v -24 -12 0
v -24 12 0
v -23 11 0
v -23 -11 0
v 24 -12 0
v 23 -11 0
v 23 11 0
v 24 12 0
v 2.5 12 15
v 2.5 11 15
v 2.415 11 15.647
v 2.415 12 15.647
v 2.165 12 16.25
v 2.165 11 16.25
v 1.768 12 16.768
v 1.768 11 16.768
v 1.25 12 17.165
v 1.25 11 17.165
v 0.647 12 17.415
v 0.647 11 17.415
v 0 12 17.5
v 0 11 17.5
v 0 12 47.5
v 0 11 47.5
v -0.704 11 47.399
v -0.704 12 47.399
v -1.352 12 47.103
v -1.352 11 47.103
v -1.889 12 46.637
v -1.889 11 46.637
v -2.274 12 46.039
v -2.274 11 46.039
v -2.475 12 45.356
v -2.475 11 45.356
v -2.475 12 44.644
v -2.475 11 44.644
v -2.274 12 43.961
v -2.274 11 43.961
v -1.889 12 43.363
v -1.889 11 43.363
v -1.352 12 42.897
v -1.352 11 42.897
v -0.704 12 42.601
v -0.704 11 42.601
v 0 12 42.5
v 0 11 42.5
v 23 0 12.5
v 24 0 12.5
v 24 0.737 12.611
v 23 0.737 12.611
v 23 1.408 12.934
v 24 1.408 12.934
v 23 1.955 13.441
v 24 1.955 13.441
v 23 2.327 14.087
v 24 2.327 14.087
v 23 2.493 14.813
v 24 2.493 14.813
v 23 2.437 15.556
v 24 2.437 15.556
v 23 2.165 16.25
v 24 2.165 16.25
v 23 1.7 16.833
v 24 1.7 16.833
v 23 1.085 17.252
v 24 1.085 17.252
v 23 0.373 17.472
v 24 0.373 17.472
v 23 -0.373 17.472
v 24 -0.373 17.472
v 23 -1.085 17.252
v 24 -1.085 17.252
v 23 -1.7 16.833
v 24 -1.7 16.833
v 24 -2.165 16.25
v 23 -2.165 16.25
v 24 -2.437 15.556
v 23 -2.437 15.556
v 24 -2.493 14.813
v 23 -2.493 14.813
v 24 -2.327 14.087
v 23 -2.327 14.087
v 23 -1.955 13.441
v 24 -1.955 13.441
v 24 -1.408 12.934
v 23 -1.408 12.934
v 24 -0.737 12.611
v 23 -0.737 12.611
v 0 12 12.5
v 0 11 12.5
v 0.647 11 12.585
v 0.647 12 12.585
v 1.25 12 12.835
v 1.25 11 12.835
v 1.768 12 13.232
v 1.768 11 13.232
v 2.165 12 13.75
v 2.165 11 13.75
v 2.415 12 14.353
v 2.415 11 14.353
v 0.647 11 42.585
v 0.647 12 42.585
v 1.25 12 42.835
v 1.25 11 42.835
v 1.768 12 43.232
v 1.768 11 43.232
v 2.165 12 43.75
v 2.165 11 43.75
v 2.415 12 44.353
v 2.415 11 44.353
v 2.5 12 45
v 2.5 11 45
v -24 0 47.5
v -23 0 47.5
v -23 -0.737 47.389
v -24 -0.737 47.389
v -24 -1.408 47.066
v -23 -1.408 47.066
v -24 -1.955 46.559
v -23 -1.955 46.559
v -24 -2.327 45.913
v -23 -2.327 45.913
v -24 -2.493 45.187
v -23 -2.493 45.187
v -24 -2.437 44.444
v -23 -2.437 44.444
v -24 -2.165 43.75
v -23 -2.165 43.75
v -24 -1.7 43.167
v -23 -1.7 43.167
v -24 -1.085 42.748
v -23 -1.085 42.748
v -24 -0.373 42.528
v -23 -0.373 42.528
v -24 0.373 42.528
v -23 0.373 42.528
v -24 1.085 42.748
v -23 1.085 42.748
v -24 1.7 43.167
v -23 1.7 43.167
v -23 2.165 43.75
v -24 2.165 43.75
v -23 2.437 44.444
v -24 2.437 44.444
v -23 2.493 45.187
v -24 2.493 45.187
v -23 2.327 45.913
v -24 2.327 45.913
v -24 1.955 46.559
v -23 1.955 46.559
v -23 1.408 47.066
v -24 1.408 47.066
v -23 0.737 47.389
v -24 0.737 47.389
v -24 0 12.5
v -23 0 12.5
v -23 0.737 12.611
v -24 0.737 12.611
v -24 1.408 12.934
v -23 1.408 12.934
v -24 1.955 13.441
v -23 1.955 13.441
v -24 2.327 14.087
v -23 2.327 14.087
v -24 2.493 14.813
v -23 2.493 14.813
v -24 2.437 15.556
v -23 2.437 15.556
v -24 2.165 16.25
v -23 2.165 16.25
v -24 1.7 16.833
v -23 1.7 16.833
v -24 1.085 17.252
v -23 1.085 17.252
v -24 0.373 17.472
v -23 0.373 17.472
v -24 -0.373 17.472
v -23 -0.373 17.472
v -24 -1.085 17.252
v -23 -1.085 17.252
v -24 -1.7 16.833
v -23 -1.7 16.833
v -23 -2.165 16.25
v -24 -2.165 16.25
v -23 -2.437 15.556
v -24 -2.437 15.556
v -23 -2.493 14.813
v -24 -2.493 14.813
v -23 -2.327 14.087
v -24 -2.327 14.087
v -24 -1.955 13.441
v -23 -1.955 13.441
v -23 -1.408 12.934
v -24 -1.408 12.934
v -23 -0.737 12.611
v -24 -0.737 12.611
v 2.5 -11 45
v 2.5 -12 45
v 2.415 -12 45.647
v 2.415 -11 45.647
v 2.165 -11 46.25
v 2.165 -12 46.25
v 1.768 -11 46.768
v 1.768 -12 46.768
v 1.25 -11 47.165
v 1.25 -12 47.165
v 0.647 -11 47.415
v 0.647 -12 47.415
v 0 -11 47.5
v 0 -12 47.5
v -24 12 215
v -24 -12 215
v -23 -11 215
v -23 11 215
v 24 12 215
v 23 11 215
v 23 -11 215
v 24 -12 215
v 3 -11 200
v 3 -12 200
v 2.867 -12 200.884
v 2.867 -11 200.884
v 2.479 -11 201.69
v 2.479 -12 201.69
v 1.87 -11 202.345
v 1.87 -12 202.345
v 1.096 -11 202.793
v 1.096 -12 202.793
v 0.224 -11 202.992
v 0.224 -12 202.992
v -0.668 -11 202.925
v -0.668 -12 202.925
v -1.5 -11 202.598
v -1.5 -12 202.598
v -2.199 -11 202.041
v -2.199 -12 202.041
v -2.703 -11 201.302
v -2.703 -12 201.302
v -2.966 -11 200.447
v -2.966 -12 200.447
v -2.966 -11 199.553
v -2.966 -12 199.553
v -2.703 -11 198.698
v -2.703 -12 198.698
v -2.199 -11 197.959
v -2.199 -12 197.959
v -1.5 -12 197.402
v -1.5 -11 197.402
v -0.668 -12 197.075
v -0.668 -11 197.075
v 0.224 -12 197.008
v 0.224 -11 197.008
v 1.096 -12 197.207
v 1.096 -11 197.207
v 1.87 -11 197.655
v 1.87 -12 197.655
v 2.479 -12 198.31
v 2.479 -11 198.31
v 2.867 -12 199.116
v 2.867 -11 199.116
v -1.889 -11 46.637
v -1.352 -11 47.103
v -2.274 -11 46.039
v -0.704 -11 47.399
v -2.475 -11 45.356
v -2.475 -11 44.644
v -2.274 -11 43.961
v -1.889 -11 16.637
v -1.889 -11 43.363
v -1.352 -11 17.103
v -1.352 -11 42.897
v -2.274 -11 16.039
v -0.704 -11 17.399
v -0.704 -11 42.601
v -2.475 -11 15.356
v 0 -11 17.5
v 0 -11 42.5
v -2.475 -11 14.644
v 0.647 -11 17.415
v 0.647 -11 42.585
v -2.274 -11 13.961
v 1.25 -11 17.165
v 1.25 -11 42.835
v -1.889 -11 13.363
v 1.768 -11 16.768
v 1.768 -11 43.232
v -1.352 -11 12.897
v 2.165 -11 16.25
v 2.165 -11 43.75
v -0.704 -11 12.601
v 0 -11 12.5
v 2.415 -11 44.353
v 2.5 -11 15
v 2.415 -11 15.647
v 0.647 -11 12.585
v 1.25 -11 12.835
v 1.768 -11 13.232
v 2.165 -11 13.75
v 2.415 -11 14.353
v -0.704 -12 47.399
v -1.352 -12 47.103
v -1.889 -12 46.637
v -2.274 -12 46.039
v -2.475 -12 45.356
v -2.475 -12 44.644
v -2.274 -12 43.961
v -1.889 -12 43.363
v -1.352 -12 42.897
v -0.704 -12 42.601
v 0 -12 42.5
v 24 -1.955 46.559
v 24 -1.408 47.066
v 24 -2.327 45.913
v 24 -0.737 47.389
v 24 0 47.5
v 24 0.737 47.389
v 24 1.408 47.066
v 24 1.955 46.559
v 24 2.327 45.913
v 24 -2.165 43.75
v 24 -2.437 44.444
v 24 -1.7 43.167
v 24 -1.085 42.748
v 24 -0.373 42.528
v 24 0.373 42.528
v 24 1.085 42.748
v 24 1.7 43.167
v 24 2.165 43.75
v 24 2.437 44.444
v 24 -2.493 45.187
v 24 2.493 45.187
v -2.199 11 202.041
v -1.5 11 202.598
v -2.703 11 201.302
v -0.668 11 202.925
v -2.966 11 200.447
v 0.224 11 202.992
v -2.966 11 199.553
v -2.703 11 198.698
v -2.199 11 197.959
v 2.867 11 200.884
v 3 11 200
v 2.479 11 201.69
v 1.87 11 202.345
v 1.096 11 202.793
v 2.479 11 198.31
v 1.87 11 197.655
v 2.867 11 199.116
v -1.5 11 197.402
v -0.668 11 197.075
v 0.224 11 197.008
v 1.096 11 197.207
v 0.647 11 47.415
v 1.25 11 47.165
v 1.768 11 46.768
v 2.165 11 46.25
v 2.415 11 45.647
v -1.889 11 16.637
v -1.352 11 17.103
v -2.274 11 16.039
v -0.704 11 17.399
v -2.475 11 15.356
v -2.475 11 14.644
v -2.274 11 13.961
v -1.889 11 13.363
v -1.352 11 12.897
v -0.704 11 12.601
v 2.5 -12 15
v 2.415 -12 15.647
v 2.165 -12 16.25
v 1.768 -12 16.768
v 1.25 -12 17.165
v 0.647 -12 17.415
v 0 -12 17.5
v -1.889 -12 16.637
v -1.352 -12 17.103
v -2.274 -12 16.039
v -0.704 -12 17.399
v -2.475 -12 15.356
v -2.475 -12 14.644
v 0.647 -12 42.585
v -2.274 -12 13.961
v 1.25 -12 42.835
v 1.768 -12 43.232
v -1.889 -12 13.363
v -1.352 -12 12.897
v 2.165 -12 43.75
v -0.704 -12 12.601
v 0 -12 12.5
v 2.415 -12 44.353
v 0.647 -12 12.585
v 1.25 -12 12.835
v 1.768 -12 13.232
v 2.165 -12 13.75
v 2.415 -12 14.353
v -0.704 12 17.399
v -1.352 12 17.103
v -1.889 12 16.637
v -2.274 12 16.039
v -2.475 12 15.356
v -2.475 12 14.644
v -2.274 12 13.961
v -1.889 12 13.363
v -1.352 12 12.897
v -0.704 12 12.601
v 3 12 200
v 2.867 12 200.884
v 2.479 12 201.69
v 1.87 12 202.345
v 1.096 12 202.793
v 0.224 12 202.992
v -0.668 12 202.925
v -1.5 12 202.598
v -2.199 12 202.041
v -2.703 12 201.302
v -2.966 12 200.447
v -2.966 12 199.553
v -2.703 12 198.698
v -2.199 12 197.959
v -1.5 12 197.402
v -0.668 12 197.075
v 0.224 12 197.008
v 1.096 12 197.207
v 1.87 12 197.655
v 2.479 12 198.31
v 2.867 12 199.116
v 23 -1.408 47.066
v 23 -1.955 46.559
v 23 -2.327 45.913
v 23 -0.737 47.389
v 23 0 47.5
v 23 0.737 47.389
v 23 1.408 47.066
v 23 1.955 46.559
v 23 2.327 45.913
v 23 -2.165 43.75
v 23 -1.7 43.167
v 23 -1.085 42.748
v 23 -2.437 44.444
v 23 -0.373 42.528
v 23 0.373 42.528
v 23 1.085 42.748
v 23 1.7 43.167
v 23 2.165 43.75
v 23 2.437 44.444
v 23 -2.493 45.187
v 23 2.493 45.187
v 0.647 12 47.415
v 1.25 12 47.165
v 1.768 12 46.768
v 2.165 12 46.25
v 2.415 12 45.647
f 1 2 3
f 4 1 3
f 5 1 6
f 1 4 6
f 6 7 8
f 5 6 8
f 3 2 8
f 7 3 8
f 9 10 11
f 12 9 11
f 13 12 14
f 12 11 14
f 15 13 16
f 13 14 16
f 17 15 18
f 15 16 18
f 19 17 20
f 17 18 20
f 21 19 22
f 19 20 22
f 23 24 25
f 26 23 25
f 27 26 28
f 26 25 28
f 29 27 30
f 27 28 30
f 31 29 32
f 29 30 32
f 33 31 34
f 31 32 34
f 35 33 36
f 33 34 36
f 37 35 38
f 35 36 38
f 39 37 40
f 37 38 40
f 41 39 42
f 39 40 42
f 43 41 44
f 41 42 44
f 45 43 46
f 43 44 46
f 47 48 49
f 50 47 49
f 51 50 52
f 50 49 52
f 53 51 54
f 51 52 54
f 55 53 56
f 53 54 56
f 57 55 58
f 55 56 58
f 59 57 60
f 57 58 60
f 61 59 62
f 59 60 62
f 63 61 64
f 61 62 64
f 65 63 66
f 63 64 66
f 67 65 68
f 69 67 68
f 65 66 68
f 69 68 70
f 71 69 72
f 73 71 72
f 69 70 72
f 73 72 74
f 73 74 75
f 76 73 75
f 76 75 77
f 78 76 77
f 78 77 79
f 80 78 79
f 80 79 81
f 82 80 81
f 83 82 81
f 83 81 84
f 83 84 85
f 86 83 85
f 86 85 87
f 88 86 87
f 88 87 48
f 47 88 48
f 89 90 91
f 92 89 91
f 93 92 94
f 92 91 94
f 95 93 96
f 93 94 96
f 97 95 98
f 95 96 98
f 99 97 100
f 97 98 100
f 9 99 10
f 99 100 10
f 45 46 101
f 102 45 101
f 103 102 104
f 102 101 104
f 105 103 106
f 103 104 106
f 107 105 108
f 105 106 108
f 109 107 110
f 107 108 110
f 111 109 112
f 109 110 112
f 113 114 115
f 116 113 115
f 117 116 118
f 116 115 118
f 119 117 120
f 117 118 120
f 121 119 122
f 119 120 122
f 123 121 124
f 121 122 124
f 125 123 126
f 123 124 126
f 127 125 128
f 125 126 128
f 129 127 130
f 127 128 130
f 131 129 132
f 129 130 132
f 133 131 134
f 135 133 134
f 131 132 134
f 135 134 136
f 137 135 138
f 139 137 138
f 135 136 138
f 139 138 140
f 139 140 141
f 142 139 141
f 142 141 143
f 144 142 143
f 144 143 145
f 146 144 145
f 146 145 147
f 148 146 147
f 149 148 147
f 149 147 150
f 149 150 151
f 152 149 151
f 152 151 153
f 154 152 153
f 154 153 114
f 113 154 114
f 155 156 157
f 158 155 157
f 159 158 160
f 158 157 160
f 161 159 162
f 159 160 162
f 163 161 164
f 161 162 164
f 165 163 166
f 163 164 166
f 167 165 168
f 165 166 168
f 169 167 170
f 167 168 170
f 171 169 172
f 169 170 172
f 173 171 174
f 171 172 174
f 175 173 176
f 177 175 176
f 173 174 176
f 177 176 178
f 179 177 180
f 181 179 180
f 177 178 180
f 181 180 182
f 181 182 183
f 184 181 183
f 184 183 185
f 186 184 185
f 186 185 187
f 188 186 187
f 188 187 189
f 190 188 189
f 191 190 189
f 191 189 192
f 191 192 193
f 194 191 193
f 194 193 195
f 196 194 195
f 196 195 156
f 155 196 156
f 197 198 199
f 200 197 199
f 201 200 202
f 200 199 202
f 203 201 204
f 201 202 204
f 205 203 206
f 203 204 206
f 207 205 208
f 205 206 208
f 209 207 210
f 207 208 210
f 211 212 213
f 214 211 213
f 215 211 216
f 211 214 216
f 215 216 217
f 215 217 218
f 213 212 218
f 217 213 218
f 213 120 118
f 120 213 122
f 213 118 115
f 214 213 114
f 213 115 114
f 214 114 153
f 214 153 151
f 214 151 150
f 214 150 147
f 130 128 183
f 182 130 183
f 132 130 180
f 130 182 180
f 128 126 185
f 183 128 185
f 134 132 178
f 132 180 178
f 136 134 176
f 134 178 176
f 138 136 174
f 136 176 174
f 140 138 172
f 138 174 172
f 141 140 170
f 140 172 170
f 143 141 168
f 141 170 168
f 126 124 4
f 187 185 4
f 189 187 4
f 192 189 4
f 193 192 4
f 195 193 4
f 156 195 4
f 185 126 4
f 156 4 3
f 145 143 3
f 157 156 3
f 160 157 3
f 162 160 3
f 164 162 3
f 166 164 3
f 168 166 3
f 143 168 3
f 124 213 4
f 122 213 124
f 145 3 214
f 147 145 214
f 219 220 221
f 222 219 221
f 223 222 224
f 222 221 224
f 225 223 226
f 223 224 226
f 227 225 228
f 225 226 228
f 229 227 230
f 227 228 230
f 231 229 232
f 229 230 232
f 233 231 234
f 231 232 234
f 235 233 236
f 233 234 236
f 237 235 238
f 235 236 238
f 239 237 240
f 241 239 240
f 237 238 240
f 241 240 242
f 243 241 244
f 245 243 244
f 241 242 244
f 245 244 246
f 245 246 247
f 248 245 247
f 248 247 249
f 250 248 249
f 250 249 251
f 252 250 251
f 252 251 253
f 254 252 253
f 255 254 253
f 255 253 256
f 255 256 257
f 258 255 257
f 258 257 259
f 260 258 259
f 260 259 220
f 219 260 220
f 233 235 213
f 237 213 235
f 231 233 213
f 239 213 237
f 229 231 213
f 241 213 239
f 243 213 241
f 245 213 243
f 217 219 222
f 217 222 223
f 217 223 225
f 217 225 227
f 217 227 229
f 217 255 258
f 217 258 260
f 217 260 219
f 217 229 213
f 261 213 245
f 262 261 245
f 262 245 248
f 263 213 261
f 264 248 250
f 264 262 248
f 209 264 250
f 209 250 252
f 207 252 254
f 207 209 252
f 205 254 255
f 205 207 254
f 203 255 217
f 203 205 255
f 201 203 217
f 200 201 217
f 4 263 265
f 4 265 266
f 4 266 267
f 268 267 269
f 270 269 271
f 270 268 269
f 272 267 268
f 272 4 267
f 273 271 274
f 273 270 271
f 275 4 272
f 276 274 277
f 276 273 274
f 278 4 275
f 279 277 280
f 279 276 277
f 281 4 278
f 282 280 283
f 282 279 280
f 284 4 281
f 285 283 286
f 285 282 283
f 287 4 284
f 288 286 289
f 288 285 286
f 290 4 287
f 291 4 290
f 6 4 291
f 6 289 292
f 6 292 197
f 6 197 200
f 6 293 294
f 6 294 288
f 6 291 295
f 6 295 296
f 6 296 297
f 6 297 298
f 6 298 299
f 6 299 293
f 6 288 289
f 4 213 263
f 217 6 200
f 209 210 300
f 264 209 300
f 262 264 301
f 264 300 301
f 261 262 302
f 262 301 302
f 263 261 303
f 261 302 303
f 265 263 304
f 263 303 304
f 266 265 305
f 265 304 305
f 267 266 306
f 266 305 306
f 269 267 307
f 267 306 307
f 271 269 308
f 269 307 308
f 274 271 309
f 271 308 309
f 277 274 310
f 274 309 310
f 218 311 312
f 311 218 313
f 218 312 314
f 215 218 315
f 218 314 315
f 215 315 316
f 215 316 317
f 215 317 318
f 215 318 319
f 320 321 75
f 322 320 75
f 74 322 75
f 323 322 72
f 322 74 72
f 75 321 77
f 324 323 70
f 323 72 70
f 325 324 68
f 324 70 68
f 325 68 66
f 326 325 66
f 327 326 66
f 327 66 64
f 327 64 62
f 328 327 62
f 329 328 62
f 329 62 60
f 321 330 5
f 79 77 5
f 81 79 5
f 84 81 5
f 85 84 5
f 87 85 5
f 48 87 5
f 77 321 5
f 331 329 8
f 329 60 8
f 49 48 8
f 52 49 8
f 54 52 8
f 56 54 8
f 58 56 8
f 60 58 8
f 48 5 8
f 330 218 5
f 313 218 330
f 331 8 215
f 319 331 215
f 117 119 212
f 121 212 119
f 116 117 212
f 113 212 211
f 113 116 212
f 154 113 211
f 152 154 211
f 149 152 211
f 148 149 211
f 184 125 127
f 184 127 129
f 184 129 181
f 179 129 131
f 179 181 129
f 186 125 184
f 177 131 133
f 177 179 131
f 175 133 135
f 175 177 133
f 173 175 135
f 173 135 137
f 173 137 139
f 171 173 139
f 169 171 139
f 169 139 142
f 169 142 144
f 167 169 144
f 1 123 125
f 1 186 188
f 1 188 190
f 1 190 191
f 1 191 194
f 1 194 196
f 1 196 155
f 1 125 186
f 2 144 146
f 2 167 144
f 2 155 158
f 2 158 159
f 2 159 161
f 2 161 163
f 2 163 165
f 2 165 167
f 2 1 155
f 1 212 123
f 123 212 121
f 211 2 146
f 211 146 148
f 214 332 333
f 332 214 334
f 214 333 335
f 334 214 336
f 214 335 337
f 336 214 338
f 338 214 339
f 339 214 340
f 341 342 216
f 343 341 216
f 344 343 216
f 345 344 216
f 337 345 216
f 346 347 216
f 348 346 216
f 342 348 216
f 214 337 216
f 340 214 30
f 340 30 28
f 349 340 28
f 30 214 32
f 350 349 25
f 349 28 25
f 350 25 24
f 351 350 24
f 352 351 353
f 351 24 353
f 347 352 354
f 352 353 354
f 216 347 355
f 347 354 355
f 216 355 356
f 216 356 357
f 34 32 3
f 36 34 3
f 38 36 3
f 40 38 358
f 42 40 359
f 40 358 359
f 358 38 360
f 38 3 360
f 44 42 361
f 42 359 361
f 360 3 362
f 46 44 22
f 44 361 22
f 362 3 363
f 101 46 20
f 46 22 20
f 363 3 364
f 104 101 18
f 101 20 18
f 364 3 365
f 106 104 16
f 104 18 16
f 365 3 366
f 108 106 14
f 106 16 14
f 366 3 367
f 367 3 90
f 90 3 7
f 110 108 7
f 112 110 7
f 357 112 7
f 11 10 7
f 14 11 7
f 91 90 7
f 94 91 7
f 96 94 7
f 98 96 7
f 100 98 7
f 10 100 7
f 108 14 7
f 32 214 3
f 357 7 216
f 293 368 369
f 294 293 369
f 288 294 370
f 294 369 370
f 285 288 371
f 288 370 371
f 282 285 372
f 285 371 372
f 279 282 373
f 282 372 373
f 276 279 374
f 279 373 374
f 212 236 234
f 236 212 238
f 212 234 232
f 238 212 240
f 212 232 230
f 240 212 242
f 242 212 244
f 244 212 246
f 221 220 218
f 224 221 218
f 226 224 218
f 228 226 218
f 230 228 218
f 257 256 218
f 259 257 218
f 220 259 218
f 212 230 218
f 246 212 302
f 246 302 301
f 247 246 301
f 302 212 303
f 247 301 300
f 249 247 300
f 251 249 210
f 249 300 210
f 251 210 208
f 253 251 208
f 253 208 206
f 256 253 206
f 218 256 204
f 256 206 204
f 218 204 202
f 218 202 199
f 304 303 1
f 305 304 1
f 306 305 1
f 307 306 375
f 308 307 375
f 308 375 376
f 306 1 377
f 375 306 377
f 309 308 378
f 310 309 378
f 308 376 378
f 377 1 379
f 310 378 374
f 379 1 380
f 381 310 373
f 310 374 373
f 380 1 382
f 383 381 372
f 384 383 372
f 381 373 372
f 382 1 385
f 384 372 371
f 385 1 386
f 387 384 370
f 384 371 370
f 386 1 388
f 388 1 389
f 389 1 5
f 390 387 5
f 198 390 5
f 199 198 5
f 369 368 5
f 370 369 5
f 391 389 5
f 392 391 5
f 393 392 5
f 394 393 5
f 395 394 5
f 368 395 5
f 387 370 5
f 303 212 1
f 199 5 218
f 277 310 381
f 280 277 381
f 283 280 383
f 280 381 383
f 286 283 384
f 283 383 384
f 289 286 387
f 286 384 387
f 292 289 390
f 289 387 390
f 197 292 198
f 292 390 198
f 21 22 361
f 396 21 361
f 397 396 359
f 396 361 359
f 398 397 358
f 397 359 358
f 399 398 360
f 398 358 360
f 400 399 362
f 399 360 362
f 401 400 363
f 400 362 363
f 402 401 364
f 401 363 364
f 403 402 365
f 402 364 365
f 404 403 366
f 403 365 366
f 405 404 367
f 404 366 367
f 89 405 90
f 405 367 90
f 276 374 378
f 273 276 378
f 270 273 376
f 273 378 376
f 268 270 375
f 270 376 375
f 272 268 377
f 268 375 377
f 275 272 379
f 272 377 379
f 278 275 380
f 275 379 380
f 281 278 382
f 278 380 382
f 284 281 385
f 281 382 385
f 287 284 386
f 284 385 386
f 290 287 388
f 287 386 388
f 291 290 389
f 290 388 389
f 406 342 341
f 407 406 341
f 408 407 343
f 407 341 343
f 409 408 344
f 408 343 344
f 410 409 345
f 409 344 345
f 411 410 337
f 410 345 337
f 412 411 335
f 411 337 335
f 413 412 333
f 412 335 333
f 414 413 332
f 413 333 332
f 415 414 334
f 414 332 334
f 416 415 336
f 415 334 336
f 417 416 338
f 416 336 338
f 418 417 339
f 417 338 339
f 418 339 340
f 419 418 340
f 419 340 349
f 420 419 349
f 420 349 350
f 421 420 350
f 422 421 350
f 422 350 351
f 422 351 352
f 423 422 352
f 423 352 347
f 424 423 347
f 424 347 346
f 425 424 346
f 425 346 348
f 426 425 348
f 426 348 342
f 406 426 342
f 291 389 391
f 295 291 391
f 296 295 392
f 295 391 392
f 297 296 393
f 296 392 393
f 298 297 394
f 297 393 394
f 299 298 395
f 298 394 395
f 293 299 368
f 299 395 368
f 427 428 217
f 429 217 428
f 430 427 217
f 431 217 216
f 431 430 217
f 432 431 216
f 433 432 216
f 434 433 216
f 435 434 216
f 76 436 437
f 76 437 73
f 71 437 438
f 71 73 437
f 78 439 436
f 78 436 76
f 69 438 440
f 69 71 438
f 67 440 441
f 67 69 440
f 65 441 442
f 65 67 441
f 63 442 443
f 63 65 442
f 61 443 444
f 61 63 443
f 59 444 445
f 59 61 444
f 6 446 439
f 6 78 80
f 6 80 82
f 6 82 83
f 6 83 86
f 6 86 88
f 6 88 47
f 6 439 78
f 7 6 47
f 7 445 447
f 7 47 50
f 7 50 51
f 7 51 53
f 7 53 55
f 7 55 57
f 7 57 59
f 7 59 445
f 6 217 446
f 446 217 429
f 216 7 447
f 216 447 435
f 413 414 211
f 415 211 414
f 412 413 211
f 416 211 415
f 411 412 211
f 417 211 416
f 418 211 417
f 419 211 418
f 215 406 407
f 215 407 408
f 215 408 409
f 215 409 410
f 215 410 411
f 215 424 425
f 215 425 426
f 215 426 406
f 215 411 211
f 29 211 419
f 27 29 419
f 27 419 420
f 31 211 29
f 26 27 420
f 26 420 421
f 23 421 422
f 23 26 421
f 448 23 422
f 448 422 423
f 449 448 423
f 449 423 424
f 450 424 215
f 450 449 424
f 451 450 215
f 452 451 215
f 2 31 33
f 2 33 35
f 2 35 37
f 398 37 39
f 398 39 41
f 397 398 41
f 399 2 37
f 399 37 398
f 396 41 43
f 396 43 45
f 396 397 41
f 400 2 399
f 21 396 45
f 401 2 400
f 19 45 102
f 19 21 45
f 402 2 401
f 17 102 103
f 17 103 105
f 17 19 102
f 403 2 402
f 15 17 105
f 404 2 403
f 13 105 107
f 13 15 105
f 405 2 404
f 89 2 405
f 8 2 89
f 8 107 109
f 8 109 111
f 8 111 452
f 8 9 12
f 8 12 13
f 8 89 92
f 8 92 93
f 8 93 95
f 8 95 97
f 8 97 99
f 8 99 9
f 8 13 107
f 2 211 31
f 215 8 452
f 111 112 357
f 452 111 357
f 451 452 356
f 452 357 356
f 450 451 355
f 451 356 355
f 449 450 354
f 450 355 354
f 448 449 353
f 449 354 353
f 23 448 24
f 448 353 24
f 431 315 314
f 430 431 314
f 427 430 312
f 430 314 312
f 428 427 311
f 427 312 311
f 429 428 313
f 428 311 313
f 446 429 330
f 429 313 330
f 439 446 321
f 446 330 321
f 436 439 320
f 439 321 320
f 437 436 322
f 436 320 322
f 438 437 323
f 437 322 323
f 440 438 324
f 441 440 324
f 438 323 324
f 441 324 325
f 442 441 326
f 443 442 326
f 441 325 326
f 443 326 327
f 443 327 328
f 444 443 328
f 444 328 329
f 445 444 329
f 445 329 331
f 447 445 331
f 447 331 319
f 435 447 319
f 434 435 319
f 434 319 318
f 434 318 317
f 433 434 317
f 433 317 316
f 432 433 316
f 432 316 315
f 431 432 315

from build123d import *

# Parameters (mm, degrees)
SKETCH2_W           = 48
SKETCH2_H           = 24
SKETCH2_W_2         = 46
SKETCH2_H_2         = 22
BOSS_EXTRUDE1_DEPTH = 240
SKETCH4_R           = 3
CUT_EXTRUDE1_DEPTH  = 240
CUT_EXTRUDE3_DEPTH  = 240
CUT_EXTRUDE4_DEPTH  = 240
SKETCH8_W           = 48
SKETCH8_H           = 25
CUT_EXTRUDE5_DEPTH  = 25


with BuildPart() as part:
    # Sketch2 → Boss-Extrude1 (new body)
    with BuildSketch(Plane.XY):
        Rectangle(SKETCH2_W, SKETCH2_H)
        Rectangle(SKETCH2_W_2, SKETCH2_H_2, mode=Mode.SUBTRACT)
    extrude(amount=BOSS_EXTRUDE1_DEPTH)

    # Sketch4 → Cut-Extrude1 (cut)
    with BuildSketch(Plane.XZ.offset(12)):
        with Locations((0, 200)):
            Circle(SKETCH4_R)
    extrude(amount=-CUT_EXTRUDE1_DEPTH, mode=Mode.SUBTRACT)

    # Sketch5 → Cut-Extrude3 (cut)
    with BuildSketch(Plane.XZ.offset(12)):
        with BuildLine():
            ThreePointArc((2.5, 45), (1.767766953, 46.767766953), (0, 47.5))
            Line((0, 47.5), (0, 42.5))
            ThreePointArc((0, 42.5), (1.767766953, 43.232233047), (2.5, 45))
        make_face()
        with BuildLine():
            Line((0, 42.5), (0, 47.5))
            ThreePointArc((0, 47.5), (-2.5, 45), (0, 42.5))
        make_face()
        with BuildLine():
            ThreePointArc((0, 17.5), (-2.5, 15), (0, 12.5))
            Line((0, 12.5), (0, 17.5))
        make_face()
        with BuildLine():
            Line((0, 17.5), (0, 12.5))
            ThreePointArc((0, 12.5), (1.767766953, 13.232233047), (2.5, 15))
            ThreePointArc((2.5, 15), (1.767766953, 16.767766953), (0, 17.5))
        make_face()
    extrude(amount=-CUT_EXTRUDE3_DEPTH, mode=Mode.SUBTRACT)

    # Sketch7 → Cut-Extrude4 (cut)
    with BuildSketch(Plane(origin=(24, 0, 0), x_dir=(0, 0, -1), z_dir=(1, 0, 0))):
        with BuildLine():
            ThreePointArc((-42.5, 0), (-45, 2.5), (-47.5, 0))
            Line((-47.5, 0), (-42.5, 0))
        make_face()
        with BuildLine():
            Line((-42.5, 0), (-47.5, 0))
            ThreePointArc((-47.5, 0), (-45, -2.5), (-42.5, 0))
        make_face()
        with BuildLine():
            ThreePointArc((-17.5, 0), (-15, -2.5), (-12.5, 0))
            Line((-12.5, 0), (-17.5, 0))
        make_face()
        with BuildLine():
            Line((-17.5, 0), (-12.5, 0))
            ThreePointArc((-12.5, 0), (-15, 2.5), (-17.5, 0))
        make_face()
    extrude(amount=-CUT_EXTRUDE4_DEPTH, mode=Mode.SUBTRACT)

    # Sketch8 → Cut-Extrude5 (cut, through all)
    with BuildSketch(Plane.XZ.offset(12)):
        with Locations((0, 227.5)):
            Rectangle(SKETCH8_W, SKETCH8_H)
    extrude(amount=-CUT_EXTRUDE5_DEPTH, mode=Mode.SUBTRACT)


solid = part.part
